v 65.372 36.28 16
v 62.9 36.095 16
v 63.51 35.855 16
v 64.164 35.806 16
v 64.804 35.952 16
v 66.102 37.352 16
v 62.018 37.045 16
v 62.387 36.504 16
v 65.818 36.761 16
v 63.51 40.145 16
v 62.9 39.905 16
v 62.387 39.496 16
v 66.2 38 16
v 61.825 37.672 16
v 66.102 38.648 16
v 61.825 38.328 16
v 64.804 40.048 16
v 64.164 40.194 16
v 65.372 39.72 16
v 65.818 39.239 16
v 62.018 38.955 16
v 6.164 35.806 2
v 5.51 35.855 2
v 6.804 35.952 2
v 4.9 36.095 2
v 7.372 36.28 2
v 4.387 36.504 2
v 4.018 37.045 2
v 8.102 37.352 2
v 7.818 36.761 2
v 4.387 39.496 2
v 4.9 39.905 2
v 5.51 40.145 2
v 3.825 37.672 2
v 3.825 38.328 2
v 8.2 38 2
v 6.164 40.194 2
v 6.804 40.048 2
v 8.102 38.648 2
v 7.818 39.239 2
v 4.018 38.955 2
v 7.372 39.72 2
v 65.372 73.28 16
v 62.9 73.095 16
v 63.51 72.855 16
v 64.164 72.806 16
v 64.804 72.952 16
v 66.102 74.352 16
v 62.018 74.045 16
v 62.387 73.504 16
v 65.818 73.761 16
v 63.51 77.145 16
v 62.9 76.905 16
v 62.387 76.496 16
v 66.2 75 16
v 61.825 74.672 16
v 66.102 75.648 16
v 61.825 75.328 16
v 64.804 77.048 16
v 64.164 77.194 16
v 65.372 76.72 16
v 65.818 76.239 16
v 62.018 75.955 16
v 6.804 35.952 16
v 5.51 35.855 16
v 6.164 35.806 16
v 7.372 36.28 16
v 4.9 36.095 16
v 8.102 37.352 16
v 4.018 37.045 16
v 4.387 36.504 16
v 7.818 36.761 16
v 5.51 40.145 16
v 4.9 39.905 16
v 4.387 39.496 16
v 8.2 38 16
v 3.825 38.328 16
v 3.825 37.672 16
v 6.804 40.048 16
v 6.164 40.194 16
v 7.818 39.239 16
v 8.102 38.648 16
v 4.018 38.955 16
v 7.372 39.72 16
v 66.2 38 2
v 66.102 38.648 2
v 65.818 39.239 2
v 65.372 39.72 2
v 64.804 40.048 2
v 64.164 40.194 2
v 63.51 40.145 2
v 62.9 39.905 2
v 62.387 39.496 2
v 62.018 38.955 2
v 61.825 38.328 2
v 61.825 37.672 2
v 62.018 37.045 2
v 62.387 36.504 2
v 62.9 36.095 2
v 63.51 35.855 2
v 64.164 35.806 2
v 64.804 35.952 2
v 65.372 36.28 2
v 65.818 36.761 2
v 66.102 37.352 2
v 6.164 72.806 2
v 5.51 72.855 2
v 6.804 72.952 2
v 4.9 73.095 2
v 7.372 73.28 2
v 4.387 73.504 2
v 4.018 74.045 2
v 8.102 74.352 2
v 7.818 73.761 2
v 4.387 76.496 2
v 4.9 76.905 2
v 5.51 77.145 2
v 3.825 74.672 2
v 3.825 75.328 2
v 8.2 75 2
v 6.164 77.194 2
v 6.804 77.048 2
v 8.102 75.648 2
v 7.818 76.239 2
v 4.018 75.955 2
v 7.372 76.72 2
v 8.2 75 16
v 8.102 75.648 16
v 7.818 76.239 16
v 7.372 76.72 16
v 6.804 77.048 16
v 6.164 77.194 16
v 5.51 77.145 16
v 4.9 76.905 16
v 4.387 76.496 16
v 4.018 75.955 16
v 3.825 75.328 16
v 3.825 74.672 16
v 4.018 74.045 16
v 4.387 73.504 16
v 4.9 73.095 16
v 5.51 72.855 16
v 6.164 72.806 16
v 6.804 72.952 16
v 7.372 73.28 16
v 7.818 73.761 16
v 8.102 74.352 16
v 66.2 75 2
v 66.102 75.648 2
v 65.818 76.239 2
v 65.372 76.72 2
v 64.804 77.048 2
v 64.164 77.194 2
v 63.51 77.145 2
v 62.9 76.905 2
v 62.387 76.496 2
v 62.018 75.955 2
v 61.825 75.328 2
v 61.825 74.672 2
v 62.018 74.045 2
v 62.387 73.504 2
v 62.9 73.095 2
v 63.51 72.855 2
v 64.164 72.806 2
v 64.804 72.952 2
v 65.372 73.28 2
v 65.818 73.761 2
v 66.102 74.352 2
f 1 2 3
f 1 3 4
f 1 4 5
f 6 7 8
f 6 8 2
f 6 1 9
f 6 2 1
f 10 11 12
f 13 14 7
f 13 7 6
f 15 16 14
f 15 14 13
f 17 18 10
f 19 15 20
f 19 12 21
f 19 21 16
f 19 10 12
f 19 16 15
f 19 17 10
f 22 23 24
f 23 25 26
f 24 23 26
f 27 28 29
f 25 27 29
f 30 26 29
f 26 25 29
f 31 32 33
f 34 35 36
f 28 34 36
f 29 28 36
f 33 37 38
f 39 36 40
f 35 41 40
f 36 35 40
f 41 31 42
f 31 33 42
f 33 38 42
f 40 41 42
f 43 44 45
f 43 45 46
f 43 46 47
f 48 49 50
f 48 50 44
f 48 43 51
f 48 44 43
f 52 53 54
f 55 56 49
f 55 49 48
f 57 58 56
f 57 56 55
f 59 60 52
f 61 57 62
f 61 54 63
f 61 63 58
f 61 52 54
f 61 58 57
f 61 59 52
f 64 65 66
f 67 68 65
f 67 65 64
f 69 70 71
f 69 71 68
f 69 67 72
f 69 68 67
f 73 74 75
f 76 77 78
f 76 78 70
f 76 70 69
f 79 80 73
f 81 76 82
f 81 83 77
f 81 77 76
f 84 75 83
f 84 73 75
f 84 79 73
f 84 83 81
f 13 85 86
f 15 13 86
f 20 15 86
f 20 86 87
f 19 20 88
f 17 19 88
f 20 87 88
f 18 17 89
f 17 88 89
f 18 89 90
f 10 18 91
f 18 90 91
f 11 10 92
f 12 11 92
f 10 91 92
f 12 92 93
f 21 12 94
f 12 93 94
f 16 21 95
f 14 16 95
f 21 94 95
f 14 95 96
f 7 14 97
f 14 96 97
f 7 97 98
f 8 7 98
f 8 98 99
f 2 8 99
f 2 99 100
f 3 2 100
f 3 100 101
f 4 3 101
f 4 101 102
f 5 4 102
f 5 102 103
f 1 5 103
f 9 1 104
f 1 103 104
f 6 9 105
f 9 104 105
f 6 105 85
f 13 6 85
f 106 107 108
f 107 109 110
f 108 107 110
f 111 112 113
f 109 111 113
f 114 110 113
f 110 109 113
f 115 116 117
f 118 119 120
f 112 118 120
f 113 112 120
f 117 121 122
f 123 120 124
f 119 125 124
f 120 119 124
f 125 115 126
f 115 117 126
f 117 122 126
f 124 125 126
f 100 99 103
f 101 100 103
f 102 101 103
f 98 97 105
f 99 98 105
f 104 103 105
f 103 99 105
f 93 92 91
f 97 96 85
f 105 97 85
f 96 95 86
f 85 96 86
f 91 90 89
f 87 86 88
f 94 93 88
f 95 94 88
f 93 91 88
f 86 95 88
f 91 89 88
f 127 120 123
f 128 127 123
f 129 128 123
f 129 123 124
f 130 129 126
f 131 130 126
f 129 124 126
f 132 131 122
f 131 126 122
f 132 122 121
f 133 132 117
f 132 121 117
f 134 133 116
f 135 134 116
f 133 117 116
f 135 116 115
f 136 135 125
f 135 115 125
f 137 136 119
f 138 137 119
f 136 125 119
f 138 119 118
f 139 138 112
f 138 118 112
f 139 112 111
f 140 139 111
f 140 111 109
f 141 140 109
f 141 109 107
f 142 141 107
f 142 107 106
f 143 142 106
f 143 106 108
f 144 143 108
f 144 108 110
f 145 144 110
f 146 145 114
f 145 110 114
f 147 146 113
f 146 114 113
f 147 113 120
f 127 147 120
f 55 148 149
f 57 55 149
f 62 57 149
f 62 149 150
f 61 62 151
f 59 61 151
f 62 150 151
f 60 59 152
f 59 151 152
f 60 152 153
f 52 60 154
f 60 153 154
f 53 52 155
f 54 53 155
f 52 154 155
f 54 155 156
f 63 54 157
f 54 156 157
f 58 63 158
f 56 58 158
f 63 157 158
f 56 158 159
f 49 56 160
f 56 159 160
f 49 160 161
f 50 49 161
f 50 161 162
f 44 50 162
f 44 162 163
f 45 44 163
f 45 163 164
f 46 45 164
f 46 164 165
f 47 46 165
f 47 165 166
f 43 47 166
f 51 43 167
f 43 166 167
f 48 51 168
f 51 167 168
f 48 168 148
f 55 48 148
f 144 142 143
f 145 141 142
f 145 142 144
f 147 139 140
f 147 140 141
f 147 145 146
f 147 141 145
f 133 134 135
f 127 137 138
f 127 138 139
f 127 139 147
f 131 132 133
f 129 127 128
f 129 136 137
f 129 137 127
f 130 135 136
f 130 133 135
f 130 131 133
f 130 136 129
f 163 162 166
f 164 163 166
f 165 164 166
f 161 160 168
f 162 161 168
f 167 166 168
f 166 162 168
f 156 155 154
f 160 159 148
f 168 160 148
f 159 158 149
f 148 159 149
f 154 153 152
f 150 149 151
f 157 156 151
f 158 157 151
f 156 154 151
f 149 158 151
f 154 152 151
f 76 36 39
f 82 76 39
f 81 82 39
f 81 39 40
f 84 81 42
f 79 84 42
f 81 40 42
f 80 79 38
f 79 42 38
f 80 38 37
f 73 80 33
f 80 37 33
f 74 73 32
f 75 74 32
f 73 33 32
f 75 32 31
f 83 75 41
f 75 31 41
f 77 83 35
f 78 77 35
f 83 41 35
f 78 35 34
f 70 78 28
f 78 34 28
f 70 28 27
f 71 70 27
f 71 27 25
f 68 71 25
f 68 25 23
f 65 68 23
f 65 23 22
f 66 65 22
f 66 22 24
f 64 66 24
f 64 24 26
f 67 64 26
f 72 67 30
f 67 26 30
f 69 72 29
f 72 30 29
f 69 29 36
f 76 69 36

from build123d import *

# Parameters (mm, degrees)
CYLINDER004_R     = 2.2
CYLINDER004_DEPTH = 14
CYLINDER005_R     = 2.2
CYLINDER005_DEPTH = 14
CYLINDER006_R     = 2.2
CYLINDER006_DEPTH = 14
CYLINDER007_R     = 2.2
CYLINDER007_DEPTH = 14


with BuildPart() as cylinder004:
    # Cylinder004 → Cylinder004 (new body)
    with BuildSketch(Plane(origin=(6, 75, 2), x_dir=(1, 0, 0), z_dir=(0, 0, 1))):
        Circle(CYLINDER004_R)
    extrude(amount=CYLINDER004_DEPTH)


with BuildPart() as cylinder005:
    # Cylinder005 → Cylinder005 (new body)
    with BuildSketch(Plane(origin=(64, 38, 2), x_dir=(1, 0, 0), z_dir=(0, 0, 1))):
        Circle(CYLINDER005_R)
    extrude(amount=CYLINDER005_DEPTH)


with BuildPart() as cylinder006:
    # Cylinder006 → Cylinder006 (new body)
    with BuildSketch(Plane(origin=(6, 38, 2), x_dir=(1, 0, 0), z_dir=(0, 0, 1))):
        Circle(CYLINDER006_R)
    extrude(amount=CYLINDER006_DEPTH)


with BuildPart() as bases001cuts:
    # Cylinder007 → Cylinder007 (new body)
    with BuildSketch(Plane(origin=(64, 75, 2), x_dir=(1, 0, 0), z_dir=(0, 0, 1))):
        Circle(CYLINDER007_R)
    extrude(amount=CYLINDER007_DEPTH)

    # Fusion001: union Cylinder004, Cylinder005, Cylinder006
    add(cylinder004.part)
    add(cylinder005.part)
    add(cylinder006.part)


solid = bases001cuts.part
